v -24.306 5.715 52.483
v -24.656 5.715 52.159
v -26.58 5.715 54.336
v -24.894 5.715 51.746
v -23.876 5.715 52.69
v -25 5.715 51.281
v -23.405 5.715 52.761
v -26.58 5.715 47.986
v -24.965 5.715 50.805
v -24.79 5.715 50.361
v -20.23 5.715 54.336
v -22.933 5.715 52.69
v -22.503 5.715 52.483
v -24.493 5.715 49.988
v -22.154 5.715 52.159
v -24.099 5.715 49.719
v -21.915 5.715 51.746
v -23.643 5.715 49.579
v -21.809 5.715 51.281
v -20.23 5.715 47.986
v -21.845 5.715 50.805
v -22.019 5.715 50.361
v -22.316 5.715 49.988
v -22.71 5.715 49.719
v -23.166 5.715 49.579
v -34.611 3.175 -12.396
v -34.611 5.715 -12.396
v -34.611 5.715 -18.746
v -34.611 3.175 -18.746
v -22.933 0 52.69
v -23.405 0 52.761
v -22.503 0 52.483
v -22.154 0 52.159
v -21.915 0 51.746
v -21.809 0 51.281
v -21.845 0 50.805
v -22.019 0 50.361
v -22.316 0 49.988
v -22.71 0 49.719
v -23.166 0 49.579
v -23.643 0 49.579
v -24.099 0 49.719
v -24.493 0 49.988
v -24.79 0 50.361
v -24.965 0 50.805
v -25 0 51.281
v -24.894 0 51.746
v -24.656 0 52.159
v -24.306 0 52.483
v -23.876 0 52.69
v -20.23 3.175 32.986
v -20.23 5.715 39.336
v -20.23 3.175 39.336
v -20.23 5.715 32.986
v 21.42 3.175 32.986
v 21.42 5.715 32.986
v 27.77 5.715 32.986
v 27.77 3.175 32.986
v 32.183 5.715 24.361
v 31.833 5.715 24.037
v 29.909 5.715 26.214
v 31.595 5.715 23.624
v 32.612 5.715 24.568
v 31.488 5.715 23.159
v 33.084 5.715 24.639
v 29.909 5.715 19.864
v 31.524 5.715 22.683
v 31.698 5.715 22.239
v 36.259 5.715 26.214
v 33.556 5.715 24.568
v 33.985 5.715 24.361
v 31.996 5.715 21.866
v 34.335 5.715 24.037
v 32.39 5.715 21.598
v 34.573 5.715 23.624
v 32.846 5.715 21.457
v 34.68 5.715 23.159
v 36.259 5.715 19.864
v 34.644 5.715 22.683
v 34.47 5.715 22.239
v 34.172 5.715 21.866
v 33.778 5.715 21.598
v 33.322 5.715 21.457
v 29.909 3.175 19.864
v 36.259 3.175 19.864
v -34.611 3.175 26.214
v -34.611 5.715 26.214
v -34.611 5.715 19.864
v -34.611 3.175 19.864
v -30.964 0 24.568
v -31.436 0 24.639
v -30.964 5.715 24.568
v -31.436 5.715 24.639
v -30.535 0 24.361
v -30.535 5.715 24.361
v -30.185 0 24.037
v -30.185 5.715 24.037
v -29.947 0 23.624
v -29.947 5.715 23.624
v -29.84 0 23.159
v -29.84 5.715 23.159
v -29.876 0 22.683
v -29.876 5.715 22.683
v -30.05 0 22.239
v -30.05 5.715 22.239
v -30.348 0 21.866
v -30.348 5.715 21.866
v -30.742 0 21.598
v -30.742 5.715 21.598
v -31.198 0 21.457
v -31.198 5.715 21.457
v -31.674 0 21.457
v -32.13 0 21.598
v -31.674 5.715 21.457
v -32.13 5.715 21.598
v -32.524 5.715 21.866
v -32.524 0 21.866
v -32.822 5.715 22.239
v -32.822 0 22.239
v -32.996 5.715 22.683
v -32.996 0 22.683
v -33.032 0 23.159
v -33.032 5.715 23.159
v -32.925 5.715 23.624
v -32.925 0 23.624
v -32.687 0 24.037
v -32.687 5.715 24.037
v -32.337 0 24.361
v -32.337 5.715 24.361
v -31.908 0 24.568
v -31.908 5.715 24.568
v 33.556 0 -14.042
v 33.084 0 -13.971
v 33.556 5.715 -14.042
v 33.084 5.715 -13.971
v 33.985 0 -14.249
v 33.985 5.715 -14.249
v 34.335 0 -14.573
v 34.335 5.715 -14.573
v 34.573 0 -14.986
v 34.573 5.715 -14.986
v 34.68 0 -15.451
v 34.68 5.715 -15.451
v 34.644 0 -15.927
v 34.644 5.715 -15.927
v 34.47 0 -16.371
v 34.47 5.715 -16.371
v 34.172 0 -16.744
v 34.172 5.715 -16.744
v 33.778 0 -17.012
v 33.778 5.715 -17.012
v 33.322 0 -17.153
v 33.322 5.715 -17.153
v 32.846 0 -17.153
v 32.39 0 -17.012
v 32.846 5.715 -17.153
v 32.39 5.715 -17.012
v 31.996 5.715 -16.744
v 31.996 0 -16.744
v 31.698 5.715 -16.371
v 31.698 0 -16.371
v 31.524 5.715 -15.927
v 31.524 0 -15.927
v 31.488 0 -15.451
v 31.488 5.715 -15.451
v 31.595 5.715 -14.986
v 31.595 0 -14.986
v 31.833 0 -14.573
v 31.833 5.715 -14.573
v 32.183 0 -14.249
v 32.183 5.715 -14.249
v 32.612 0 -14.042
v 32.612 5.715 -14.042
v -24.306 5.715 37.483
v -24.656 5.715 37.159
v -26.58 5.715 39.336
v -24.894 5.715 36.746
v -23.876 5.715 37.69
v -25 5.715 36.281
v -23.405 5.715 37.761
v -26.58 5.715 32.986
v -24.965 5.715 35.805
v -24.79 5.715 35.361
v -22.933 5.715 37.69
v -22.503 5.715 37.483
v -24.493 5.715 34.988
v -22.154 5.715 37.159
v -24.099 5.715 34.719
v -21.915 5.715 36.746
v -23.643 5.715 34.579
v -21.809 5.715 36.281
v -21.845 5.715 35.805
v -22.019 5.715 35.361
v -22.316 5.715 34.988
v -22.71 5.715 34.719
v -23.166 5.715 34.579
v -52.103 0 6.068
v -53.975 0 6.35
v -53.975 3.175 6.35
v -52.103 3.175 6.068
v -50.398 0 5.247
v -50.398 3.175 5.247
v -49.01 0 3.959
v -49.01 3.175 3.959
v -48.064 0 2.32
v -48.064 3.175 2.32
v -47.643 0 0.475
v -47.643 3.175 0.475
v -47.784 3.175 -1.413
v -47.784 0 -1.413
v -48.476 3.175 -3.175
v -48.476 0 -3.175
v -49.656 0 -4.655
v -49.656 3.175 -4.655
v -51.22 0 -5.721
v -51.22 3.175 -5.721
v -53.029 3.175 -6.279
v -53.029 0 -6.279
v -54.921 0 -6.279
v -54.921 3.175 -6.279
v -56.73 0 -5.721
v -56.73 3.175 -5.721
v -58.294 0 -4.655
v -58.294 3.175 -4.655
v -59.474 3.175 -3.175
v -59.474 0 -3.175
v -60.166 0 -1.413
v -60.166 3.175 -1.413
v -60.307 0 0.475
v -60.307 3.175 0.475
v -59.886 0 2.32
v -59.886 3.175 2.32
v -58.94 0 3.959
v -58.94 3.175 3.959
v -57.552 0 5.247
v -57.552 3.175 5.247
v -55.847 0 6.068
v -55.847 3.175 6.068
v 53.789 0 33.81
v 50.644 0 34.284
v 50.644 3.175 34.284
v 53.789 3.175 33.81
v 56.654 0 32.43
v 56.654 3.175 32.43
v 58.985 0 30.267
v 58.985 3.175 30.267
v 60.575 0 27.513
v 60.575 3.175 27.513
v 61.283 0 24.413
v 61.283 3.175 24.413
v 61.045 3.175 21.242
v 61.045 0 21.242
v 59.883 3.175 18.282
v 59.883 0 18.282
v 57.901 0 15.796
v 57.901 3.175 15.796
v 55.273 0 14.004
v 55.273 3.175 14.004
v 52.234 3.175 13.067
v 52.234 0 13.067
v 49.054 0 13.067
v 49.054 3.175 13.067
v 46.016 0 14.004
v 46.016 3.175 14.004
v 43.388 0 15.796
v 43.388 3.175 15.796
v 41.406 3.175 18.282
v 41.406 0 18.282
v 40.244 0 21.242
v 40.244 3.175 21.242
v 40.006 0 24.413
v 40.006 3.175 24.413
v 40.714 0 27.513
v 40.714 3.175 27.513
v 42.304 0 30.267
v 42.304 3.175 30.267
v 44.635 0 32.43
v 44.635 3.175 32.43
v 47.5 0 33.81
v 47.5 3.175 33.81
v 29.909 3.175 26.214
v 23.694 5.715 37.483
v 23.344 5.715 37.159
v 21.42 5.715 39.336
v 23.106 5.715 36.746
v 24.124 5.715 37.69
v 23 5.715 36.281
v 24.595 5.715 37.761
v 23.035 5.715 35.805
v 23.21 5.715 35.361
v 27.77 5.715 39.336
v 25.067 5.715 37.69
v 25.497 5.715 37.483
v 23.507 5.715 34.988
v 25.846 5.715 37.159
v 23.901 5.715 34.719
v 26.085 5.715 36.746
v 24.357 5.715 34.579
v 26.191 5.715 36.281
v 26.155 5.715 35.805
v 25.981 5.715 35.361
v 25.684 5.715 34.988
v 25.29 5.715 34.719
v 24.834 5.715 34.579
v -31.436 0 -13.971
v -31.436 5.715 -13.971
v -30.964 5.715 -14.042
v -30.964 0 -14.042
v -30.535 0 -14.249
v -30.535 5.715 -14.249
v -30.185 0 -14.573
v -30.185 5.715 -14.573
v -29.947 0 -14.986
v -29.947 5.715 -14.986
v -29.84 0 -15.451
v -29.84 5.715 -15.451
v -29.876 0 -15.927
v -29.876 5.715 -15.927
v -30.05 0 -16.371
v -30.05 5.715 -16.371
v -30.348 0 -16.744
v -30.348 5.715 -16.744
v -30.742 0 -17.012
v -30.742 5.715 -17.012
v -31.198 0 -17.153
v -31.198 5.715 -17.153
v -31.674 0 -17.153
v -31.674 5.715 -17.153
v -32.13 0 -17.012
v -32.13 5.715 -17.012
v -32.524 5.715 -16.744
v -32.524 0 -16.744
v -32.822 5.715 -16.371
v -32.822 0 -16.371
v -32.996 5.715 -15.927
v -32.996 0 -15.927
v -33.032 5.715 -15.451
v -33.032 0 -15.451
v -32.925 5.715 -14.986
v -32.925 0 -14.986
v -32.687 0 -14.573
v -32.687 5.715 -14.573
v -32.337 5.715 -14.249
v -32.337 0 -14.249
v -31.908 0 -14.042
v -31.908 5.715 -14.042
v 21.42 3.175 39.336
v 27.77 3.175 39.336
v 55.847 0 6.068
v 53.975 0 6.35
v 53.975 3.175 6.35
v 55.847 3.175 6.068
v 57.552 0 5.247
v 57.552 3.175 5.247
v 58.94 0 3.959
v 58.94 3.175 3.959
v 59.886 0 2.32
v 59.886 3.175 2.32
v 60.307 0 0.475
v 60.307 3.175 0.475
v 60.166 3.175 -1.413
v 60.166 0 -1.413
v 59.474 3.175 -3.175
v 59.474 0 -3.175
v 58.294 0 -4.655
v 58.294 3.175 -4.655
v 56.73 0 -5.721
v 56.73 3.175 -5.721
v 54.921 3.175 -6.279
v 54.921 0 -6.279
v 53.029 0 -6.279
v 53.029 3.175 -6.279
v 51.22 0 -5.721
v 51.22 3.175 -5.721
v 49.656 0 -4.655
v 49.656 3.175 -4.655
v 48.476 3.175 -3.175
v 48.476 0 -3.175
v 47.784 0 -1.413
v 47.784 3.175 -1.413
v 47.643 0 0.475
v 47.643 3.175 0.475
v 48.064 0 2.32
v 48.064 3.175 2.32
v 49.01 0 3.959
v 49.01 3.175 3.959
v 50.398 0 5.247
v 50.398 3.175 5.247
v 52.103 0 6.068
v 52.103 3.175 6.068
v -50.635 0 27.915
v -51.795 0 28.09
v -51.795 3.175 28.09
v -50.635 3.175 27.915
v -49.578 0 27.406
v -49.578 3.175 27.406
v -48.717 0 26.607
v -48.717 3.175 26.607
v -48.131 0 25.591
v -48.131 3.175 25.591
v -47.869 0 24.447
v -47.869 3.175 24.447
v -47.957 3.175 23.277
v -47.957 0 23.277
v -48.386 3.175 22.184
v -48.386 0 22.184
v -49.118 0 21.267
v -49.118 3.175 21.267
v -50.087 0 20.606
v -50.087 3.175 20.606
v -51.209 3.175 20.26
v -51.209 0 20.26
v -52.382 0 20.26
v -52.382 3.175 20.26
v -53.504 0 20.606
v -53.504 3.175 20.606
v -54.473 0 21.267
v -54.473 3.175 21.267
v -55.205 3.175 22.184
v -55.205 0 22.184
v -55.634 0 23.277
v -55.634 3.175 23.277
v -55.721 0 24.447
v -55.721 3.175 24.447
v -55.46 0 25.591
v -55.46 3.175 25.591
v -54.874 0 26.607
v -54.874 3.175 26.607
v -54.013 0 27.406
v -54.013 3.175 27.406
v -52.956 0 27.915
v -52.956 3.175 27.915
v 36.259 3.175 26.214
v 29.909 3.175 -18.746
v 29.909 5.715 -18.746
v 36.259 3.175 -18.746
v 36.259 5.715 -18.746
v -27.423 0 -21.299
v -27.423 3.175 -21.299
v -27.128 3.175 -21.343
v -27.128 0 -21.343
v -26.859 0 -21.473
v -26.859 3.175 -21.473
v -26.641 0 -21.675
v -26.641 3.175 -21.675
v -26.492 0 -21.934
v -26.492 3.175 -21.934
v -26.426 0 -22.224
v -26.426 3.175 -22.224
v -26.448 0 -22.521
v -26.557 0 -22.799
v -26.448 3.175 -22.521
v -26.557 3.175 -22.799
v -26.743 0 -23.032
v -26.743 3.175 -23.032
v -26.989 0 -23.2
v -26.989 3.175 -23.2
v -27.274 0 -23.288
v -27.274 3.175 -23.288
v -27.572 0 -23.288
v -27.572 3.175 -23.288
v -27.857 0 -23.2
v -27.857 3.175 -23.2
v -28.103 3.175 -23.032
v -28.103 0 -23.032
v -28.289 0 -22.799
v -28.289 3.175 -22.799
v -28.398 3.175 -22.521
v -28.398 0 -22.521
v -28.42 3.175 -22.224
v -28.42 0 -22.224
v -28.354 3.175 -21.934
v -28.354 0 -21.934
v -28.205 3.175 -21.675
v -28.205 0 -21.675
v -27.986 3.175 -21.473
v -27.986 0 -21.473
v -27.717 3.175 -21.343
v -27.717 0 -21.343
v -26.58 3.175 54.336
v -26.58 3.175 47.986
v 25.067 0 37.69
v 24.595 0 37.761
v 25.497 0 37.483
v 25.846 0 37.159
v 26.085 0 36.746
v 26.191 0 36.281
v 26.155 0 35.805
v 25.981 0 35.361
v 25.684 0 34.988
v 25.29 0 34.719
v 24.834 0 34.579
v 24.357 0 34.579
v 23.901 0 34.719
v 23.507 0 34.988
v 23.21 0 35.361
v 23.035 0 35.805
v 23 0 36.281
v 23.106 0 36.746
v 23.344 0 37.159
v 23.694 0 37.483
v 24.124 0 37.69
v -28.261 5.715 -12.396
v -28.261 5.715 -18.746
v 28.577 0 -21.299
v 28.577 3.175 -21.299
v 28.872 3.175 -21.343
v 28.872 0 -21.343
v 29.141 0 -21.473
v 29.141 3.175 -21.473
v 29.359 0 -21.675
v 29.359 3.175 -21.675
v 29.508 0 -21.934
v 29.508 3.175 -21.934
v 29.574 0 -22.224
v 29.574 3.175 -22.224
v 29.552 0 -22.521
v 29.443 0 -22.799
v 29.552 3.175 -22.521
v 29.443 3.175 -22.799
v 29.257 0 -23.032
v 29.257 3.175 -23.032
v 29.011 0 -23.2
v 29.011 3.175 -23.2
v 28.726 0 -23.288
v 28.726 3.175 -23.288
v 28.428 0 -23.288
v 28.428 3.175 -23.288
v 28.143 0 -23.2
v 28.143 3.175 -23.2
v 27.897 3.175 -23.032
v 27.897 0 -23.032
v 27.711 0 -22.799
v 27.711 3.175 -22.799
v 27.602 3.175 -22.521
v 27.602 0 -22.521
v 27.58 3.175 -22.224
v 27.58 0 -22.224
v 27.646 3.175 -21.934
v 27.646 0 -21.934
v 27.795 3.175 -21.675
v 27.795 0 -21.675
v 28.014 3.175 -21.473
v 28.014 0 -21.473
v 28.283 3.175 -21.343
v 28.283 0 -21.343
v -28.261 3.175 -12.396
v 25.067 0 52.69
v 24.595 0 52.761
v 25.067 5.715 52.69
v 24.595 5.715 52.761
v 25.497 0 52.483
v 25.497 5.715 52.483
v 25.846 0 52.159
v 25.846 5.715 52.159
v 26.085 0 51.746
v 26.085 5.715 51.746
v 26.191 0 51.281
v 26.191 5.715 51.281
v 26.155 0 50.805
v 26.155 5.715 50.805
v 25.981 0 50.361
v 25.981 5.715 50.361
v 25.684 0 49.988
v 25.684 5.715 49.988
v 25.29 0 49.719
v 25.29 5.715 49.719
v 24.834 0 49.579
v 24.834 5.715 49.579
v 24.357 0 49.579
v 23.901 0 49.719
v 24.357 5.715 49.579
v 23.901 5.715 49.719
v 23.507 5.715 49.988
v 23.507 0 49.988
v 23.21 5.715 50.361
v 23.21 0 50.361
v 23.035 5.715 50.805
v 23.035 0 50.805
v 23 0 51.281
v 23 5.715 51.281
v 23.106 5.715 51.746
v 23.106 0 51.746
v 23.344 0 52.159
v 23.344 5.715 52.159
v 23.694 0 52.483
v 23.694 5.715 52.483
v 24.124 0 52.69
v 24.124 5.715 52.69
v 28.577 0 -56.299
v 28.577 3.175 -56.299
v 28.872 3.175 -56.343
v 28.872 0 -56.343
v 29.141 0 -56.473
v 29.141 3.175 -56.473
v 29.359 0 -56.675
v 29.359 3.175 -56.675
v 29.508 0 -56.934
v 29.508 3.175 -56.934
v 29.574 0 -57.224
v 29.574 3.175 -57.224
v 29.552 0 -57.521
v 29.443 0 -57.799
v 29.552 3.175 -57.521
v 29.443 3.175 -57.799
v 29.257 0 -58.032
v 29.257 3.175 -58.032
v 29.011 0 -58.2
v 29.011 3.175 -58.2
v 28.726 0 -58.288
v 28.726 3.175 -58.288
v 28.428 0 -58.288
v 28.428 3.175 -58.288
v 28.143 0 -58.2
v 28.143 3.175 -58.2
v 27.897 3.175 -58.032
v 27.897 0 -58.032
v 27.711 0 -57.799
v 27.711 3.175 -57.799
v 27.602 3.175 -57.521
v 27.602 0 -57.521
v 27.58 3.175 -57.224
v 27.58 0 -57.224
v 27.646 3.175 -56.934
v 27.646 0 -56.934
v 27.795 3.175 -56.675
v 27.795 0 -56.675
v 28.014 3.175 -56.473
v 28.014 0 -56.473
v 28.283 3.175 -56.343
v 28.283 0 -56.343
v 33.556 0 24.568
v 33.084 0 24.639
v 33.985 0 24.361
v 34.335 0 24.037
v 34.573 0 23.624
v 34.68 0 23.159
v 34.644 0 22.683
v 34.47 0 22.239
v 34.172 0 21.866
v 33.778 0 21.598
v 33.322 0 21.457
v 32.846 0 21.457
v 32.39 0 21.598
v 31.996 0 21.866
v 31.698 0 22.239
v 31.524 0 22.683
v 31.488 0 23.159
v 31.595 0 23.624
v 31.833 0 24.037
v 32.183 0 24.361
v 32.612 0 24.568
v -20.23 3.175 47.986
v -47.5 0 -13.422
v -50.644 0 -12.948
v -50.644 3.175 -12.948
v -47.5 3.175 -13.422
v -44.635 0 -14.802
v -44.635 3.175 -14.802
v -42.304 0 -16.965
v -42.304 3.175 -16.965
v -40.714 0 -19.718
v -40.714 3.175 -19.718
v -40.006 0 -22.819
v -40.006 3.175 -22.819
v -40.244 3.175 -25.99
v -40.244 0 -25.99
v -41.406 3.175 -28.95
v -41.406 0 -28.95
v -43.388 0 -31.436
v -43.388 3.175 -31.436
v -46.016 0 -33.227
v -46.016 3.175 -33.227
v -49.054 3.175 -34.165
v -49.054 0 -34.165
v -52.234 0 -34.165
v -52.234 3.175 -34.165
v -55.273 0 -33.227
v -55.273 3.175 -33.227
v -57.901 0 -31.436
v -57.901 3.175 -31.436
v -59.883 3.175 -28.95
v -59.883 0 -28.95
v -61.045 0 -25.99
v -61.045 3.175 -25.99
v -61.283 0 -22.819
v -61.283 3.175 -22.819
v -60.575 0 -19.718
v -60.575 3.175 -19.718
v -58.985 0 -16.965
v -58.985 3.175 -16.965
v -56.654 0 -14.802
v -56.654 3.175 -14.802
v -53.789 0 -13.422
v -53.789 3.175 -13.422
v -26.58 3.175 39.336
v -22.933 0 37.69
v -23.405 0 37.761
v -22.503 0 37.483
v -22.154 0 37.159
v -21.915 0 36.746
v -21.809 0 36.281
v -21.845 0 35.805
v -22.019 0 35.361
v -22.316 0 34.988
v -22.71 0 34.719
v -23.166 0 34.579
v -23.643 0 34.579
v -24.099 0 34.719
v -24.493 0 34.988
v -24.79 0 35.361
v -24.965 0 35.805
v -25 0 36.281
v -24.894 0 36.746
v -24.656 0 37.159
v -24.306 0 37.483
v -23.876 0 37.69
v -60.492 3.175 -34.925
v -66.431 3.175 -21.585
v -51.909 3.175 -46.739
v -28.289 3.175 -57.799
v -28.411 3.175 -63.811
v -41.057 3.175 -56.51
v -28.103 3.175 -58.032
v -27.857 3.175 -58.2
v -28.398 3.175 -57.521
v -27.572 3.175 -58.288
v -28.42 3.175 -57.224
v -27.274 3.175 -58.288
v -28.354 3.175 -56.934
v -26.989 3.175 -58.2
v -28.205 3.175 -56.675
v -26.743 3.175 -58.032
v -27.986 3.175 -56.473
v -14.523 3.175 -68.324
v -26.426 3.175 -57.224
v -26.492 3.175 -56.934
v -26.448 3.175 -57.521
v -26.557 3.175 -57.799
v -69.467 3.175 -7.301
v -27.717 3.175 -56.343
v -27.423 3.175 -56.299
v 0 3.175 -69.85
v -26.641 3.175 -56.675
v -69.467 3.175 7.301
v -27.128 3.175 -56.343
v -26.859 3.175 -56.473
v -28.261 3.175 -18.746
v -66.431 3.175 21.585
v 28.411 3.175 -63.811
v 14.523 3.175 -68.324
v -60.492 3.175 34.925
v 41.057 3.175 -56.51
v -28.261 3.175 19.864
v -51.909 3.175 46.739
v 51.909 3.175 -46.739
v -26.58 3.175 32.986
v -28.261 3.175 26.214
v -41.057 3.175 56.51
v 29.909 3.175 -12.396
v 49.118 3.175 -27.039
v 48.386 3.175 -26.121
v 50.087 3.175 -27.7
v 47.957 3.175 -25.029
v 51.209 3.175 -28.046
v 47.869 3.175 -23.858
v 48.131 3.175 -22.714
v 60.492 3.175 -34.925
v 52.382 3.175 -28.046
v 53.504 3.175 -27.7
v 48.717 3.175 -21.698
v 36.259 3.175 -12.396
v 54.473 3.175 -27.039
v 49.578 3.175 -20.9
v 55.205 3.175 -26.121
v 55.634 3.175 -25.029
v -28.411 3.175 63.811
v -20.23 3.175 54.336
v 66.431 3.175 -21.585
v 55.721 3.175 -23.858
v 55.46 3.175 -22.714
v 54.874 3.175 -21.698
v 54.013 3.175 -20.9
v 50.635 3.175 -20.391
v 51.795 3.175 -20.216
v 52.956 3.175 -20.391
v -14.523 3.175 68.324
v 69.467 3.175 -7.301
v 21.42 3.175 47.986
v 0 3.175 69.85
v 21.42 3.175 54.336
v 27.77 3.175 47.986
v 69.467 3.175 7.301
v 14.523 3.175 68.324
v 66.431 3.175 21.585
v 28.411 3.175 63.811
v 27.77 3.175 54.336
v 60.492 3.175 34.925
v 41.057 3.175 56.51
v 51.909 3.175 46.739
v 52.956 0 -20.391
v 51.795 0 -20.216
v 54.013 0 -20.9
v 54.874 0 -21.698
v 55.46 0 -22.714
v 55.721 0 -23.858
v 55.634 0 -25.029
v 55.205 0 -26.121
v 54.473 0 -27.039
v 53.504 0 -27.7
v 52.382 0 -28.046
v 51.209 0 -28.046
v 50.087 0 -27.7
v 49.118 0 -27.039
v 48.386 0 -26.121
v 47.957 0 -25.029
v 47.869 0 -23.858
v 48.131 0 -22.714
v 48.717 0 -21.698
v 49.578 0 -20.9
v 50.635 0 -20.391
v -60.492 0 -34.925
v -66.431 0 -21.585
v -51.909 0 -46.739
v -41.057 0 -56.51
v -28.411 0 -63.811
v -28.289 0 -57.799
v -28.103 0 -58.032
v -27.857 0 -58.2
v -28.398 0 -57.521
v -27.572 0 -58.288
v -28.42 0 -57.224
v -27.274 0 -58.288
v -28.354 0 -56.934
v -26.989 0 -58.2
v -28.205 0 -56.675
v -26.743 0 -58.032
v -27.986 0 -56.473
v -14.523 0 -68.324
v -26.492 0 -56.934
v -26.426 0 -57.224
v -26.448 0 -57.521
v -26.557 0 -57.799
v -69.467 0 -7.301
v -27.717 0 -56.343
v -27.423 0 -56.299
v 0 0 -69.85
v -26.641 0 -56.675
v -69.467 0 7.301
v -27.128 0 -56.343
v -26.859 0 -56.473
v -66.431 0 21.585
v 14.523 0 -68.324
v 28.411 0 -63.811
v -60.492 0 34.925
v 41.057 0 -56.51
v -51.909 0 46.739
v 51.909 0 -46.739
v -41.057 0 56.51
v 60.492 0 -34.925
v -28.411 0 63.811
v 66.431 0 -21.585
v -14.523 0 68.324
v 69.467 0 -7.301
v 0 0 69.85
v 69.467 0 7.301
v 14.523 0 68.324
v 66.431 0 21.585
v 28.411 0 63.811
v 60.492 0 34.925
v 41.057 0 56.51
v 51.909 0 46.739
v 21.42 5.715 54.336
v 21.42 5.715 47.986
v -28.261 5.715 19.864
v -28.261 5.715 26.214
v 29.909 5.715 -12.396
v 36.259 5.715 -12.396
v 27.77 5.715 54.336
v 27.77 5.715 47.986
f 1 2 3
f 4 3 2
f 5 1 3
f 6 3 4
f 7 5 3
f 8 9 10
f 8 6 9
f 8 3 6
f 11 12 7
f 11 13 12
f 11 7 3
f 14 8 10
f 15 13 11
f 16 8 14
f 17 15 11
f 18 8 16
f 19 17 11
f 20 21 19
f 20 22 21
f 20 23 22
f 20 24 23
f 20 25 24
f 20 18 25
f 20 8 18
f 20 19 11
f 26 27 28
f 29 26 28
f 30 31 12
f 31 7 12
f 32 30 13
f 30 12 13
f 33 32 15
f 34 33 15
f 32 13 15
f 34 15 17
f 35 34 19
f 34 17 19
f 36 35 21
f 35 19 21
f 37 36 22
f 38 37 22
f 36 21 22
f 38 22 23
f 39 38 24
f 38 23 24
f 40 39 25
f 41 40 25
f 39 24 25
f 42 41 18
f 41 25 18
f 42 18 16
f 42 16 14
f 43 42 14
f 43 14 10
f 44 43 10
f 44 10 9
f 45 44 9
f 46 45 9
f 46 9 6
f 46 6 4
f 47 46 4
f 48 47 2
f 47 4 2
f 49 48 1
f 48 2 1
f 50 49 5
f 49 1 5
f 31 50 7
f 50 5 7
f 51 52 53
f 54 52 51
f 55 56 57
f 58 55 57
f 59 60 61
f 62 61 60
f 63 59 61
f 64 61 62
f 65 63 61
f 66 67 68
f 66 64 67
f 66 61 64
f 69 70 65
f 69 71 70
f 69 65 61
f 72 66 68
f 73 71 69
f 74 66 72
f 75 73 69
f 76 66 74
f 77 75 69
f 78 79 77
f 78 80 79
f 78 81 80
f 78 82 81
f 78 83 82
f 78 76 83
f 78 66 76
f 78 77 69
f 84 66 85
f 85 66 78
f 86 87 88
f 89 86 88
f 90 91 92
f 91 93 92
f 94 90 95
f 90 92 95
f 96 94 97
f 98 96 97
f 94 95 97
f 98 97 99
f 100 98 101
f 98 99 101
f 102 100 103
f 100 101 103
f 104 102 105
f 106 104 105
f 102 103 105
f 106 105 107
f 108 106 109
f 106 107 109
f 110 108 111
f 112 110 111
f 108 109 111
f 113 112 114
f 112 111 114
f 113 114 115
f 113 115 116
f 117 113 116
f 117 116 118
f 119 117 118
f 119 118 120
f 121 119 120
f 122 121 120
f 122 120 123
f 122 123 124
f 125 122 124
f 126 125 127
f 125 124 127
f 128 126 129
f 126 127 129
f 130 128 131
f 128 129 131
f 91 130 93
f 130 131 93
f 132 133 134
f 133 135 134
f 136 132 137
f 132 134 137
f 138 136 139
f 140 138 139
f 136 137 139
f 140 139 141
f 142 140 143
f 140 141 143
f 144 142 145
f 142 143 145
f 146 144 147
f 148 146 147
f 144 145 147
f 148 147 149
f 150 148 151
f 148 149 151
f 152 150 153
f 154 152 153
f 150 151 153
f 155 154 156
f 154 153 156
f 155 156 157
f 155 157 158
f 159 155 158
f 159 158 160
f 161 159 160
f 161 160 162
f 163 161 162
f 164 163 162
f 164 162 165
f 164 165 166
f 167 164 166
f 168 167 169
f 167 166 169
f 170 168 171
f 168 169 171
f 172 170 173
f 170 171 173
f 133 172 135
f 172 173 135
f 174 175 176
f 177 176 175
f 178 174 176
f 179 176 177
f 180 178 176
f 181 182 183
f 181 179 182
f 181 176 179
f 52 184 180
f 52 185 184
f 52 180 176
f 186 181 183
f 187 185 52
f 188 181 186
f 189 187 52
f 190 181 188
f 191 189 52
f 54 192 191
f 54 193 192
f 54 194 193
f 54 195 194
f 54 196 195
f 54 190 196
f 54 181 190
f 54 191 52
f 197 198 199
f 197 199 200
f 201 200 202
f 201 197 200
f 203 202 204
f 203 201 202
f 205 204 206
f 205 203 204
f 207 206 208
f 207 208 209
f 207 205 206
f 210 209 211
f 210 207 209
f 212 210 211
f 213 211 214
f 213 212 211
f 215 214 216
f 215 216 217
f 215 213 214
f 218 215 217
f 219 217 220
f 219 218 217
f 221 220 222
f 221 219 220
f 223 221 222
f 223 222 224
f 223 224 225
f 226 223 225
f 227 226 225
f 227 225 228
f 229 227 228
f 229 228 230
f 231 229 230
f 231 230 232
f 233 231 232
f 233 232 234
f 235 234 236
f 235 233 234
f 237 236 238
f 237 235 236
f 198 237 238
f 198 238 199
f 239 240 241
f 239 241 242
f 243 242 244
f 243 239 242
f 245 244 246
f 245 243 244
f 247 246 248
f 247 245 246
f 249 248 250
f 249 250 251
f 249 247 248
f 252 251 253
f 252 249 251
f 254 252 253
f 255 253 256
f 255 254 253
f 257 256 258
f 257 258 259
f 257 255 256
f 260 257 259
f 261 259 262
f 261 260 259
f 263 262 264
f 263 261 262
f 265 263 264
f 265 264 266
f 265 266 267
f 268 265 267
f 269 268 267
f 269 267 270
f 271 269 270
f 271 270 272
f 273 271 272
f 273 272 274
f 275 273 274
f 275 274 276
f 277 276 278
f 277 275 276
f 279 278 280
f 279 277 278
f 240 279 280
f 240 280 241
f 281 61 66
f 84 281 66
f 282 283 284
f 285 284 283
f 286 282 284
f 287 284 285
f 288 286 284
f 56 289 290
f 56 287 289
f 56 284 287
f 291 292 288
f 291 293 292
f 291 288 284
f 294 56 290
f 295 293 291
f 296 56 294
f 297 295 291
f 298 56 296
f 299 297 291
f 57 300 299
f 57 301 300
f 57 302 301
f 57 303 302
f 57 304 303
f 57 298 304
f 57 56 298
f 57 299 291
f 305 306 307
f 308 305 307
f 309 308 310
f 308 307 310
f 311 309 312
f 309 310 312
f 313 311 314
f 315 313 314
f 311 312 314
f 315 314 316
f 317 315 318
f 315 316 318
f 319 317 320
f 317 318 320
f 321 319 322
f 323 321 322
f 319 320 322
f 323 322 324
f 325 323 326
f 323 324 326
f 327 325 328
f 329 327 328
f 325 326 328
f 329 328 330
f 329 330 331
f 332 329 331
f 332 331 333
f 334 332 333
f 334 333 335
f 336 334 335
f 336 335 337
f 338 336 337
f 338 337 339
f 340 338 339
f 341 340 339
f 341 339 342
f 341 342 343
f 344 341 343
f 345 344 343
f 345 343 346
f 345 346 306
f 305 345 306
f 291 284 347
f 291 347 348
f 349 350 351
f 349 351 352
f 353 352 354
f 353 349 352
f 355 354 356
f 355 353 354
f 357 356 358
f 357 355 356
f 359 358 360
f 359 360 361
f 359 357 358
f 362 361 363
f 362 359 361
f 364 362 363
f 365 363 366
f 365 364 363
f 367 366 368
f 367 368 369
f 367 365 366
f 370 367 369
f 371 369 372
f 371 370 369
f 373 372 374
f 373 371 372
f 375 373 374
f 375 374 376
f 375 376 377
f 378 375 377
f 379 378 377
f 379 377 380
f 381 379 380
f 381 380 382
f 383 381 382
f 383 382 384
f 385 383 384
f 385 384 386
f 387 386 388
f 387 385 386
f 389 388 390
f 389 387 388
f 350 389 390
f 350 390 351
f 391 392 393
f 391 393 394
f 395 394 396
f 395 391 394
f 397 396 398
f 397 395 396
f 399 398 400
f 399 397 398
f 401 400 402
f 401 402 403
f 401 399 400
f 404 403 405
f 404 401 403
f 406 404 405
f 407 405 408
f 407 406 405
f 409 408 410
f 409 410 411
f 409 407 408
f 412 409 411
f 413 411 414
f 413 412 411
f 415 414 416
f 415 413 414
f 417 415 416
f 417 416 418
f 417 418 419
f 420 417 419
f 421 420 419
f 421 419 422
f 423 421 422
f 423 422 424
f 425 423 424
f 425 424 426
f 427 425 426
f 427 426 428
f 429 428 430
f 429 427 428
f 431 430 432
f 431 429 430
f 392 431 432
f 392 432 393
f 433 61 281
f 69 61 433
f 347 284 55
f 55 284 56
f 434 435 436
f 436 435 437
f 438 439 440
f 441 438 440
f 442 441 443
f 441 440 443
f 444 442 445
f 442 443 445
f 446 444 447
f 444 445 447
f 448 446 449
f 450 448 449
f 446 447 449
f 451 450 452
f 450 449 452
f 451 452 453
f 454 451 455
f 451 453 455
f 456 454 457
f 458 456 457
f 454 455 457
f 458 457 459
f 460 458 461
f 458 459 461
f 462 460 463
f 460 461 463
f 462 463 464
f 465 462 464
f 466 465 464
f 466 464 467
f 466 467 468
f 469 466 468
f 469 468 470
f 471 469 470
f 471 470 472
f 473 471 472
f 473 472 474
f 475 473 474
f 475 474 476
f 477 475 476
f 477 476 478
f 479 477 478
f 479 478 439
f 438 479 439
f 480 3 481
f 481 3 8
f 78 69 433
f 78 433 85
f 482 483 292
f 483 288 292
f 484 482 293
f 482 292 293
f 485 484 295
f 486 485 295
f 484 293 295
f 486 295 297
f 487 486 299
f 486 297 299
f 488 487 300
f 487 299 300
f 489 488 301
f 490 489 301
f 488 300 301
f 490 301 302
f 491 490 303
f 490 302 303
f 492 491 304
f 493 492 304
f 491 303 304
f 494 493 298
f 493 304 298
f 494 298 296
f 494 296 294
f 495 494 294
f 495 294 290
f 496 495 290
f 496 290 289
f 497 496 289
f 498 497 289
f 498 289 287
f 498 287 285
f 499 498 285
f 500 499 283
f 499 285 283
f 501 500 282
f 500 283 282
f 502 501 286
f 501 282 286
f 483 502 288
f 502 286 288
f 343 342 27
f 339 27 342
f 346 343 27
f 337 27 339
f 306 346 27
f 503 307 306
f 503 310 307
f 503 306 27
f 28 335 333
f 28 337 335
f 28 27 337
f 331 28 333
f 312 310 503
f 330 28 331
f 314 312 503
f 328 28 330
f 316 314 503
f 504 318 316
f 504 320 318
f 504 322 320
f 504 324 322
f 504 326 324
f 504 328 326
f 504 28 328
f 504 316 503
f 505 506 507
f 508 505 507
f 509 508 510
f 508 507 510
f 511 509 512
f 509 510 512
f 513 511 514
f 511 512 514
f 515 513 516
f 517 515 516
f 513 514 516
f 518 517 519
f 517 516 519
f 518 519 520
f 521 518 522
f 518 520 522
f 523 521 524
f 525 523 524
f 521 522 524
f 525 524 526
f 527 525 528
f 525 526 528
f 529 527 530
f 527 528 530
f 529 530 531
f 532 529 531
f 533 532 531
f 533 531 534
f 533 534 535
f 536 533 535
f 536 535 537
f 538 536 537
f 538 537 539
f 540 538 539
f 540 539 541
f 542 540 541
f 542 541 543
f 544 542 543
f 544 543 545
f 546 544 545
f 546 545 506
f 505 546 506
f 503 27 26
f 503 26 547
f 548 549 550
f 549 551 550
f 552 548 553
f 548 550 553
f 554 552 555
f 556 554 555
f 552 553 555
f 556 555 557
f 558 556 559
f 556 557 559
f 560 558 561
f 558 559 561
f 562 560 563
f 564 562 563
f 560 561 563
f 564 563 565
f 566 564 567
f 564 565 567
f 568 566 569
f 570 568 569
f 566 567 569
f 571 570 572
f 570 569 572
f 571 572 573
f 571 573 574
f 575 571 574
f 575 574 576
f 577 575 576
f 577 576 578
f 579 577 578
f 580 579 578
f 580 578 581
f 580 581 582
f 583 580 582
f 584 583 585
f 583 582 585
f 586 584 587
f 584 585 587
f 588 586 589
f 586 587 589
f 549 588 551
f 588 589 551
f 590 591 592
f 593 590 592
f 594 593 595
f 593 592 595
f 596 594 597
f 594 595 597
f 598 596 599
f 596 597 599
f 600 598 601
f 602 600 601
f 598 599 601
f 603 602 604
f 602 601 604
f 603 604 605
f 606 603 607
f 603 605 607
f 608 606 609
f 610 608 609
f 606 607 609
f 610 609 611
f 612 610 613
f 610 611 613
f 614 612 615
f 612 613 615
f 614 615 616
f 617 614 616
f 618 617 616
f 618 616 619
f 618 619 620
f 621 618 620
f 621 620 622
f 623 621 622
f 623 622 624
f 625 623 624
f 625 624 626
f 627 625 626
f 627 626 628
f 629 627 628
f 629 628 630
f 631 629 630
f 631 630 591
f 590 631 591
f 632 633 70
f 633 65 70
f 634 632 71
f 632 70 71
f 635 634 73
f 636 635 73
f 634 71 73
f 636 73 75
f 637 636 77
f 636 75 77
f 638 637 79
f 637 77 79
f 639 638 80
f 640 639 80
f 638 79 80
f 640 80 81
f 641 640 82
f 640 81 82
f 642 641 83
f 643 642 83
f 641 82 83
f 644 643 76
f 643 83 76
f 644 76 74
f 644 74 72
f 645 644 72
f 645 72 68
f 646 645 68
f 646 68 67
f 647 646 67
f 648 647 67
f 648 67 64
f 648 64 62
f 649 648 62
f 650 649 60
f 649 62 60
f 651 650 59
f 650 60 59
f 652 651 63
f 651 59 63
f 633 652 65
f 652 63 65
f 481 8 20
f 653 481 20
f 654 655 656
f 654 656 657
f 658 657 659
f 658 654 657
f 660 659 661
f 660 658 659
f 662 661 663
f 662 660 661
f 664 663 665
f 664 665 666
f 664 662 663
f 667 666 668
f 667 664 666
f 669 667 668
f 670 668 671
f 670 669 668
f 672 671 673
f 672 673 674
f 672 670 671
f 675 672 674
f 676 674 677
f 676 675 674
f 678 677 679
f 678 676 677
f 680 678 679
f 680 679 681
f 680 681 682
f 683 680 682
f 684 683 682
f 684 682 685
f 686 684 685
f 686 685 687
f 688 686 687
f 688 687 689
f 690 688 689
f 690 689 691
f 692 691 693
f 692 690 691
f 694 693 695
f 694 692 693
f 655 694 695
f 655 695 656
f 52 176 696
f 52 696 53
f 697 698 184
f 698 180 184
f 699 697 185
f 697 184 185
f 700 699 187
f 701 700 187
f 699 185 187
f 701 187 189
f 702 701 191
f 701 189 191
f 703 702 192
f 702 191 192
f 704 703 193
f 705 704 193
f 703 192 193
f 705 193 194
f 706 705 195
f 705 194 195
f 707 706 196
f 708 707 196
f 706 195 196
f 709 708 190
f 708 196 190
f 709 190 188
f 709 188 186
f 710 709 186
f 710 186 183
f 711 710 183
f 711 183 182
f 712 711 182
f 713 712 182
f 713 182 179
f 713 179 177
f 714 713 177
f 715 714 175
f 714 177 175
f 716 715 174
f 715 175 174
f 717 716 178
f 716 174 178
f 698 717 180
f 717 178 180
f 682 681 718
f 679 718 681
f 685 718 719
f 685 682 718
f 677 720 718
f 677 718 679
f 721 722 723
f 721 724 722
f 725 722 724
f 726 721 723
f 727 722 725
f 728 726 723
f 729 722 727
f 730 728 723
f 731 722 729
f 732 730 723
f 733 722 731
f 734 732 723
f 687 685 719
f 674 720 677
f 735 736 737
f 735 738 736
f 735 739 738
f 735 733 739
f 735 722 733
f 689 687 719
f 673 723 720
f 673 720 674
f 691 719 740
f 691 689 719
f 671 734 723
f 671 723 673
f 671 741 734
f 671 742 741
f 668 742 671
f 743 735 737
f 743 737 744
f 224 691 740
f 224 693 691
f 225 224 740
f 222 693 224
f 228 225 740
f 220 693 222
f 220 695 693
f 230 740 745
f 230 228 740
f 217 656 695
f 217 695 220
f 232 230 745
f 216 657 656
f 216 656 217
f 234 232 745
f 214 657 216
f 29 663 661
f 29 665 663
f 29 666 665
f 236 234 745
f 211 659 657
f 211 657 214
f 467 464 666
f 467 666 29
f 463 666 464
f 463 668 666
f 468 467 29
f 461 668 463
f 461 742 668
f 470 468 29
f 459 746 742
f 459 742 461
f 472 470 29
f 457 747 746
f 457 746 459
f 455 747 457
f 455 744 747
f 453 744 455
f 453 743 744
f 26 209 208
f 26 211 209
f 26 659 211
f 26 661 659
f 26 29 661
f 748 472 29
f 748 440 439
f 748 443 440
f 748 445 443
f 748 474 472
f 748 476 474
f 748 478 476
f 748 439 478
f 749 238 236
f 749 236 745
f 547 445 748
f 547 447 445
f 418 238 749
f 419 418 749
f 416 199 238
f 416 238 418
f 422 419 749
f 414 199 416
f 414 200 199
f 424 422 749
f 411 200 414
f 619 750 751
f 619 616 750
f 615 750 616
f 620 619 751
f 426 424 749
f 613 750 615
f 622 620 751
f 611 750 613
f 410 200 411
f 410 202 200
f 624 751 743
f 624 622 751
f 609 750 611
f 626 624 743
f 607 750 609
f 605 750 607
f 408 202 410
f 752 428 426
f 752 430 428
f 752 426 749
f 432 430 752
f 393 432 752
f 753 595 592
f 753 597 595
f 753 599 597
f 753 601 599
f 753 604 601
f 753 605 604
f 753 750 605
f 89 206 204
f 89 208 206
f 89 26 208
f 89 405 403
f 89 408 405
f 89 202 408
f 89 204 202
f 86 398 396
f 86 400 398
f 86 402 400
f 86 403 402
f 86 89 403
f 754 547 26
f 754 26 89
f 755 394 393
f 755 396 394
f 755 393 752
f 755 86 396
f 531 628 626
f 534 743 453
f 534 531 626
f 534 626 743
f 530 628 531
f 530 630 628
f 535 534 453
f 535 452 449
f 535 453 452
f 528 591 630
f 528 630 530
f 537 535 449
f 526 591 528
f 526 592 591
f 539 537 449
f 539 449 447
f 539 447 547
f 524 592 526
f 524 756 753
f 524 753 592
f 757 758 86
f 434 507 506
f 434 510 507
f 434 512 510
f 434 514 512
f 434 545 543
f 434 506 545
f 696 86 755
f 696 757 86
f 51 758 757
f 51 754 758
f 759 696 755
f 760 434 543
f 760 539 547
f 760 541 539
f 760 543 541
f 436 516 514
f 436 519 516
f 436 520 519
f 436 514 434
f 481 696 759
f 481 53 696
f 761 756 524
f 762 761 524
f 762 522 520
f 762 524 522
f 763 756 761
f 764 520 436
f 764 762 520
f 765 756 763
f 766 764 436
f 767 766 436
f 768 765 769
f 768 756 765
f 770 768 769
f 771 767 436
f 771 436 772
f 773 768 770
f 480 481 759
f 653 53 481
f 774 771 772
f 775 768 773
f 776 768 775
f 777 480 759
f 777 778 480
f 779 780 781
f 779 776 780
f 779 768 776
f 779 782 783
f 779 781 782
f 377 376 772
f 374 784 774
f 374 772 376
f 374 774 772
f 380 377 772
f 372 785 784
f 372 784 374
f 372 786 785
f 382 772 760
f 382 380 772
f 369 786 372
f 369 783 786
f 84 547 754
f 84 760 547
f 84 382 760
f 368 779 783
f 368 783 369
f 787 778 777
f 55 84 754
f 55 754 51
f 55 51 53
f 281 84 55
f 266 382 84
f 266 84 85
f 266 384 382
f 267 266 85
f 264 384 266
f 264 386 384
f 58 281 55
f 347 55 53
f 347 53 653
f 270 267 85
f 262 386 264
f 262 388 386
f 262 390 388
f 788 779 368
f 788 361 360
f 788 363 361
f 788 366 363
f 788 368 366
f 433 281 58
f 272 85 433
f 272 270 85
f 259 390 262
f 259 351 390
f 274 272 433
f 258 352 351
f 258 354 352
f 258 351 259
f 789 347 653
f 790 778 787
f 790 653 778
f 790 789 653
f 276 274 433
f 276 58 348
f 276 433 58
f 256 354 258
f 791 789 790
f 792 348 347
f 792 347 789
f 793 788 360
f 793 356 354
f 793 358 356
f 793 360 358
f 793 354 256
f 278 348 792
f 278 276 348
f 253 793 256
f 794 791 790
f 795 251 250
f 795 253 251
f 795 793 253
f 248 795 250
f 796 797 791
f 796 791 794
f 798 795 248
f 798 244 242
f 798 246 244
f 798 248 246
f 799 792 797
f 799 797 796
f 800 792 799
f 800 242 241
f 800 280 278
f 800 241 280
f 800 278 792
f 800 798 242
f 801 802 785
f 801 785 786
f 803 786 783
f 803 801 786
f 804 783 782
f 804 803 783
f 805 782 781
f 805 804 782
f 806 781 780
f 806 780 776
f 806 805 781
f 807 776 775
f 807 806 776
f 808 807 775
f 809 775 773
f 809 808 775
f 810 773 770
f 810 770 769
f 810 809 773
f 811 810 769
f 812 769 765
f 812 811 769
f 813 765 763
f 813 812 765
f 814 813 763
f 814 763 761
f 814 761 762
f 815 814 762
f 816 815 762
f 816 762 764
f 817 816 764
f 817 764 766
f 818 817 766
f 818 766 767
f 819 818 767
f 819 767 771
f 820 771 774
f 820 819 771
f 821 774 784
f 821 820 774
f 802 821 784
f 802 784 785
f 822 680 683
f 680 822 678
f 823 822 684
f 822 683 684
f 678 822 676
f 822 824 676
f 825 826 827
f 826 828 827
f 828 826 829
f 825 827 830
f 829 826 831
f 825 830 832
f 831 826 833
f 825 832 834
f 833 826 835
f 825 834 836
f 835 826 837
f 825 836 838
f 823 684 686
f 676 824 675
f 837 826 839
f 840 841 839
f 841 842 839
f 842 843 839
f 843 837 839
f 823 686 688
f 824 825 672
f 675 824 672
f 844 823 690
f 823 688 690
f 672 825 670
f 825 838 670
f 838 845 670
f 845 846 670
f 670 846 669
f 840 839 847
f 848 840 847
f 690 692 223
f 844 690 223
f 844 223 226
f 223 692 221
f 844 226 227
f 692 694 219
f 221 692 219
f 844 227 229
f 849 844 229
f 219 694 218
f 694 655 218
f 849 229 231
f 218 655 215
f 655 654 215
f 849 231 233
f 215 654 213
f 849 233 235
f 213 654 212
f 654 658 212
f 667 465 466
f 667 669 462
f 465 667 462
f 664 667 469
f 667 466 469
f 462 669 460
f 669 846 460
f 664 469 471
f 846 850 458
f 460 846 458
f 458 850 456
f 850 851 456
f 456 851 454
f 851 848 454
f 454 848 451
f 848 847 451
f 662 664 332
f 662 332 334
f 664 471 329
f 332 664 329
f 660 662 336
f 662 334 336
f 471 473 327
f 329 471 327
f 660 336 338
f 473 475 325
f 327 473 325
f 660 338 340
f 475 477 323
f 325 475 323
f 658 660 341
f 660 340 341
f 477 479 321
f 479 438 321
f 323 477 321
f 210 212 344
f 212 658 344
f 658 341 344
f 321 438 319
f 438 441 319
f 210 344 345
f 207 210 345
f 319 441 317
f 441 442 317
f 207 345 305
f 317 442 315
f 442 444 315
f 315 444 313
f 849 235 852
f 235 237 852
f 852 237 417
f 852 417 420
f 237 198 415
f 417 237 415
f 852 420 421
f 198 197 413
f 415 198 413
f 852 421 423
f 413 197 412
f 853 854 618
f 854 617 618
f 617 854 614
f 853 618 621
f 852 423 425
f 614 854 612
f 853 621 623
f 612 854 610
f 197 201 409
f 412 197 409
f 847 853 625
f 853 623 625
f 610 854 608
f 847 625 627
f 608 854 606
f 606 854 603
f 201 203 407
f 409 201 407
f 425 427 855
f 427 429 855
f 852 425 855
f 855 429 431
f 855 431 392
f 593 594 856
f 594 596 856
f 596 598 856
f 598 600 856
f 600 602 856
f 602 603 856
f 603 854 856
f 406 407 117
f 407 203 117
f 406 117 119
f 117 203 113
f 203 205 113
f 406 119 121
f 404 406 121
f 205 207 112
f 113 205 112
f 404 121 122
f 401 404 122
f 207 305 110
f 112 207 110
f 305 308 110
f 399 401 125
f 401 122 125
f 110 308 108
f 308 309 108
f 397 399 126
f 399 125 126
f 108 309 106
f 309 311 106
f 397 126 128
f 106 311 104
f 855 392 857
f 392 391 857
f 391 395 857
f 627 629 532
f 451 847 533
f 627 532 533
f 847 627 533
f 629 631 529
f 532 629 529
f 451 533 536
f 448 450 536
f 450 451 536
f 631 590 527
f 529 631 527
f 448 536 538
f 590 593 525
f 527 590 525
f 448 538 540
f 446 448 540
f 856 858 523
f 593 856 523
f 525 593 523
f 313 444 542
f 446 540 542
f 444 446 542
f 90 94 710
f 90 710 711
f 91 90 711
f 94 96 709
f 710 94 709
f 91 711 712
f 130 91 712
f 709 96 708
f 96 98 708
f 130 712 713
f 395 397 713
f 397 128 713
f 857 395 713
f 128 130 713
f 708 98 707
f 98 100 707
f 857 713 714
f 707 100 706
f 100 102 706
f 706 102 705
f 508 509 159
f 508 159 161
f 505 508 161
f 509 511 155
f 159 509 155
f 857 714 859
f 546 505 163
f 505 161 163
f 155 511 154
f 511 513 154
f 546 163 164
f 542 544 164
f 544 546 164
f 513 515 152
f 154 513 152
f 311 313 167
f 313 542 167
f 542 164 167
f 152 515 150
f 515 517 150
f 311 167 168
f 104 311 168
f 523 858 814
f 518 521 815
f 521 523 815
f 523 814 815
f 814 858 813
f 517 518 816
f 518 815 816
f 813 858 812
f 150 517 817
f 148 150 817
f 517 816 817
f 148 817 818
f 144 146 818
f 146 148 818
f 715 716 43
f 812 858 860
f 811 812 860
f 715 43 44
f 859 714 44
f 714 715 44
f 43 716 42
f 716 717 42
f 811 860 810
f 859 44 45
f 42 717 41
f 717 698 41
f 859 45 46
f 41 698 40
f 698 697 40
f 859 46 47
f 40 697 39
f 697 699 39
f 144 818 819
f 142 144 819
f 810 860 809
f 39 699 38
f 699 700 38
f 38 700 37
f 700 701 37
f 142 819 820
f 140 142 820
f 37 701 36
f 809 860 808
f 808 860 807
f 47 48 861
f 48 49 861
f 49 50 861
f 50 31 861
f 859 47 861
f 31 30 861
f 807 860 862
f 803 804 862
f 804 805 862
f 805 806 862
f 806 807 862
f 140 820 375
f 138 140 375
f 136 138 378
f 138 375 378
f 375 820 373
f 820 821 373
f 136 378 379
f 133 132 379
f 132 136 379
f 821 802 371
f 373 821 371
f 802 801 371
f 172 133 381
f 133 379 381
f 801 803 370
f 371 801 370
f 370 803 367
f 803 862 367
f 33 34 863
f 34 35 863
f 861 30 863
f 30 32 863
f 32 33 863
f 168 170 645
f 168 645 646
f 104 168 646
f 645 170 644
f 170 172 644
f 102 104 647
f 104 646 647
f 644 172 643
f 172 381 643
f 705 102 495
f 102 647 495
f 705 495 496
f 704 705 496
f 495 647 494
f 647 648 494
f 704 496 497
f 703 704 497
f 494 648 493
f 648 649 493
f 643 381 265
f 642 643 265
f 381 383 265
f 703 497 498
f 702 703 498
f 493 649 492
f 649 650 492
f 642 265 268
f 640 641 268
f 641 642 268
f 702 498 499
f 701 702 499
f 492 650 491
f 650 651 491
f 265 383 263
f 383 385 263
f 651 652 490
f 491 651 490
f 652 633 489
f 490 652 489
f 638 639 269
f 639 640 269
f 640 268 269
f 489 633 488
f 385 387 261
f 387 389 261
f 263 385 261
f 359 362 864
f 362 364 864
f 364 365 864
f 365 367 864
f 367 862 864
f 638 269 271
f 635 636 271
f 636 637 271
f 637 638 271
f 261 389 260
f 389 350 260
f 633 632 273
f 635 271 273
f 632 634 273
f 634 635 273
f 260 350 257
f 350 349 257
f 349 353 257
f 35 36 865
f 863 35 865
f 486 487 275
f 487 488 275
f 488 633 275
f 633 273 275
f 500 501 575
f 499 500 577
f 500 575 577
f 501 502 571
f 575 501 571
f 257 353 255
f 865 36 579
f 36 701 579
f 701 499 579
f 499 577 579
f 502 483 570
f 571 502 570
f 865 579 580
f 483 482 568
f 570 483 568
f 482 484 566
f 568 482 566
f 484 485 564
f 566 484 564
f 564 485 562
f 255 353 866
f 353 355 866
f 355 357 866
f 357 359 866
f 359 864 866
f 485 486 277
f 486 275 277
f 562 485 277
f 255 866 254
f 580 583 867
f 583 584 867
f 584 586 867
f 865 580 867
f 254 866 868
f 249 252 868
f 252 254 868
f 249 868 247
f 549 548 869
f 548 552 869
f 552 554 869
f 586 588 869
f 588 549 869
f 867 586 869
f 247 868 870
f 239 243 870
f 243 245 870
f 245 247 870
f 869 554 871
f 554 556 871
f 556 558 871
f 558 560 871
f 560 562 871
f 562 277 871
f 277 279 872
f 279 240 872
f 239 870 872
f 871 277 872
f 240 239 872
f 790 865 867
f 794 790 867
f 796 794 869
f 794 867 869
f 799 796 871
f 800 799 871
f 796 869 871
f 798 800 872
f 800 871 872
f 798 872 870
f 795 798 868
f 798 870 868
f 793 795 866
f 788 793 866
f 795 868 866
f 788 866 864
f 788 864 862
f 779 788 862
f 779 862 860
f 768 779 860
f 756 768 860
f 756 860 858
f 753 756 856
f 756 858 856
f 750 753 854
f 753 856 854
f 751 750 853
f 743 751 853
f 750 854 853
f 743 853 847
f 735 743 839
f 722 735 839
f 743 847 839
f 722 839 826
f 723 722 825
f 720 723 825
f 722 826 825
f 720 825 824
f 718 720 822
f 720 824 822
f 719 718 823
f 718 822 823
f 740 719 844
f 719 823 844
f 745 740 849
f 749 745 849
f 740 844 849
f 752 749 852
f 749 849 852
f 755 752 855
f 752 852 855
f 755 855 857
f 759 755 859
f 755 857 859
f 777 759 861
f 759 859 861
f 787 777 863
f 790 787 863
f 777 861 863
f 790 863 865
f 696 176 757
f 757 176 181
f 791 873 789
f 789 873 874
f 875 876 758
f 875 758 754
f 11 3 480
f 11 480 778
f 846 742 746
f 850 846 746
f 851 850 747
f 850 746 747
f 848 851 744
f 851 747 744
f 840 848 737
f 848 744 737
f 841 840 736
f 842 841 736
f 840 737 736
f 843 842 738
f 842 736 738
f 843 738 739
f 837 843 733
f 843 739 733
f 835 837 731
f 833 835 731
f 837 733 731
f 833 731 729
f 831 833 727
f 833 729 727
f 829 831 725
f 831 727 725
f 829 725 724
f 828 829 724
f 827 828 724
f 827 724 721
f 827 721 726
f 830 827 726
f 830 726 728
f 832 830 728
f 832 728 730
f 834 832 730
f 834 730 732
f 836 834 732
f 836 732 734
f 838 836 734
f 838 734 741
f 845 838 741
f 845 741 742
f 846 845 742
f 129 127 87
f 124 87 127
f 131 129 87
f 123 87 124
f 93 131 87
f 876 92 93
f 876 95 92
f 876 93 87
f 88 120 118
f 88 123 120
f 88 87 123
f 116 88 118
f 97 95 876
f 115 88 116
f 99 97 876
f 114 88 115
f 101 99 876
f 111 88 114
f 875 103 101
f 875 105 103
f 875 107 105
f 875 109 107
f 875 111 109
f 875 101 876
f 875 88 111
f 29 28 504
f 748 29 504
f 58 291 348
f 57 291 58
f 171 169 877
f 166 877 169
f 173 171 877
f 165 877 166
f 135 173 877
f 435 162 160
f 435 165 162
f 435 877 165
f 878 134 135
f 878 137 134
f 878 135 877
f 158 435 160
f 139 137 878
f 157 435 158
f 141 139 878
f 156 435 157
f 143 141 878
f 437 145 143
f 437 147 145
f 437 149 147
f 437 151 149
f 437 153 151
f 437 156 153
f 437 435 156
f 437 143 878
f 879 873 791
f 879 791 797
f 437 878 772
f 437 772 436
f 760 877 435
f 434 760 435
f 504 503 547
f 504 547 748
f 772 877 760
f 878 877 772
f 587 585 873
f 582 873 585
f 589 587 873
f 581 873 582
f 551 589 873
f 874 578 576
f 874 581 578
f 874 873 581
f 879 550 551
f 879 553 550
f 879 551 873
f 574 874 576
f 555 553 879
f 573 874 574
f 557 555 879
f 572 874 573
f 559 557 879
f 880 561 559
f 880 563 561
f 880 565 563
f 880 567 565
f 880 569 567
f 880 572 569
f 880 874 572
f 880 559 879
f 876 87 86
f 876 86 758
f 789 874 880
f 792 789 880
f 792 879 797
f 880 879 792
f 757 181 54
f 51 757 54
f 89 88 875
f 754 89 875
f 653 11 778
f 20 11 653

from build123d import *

# Parameters (mm, degrees)
SKETCH1_R           = 69.85
SKETCH1_R_2         = 3.937
SKETCH1_R_3         = 6.35
SKETCH1_R_4         = 10.668
BOSS_EXTRUDE1_DEPTH = 3.175
SKETCH5_R           = 1.00000054
CUT_EXTRUDE1_DEPTH  = 25.4
SKETCH2_R           = 1.600000102
SKETCH2_R_2         = 1.6
CUT_EXTRUDE2_DEPTH  = 25.4
BOSS_EXTRUDE2_START = 2.54
SKETCH2_9_W         = 6.35
SKETCH2_9_H         = 6.35
SKETCH2_9_R         = 1.6
SKETCH2_9_R_2       = 1.600000102
BOSS_EXTRUDE2_DEPTH = 2.54


with BuildPart() as part:
    # Sketch1 → Boss-Extrude1 (new body)
    with BuildSketch(Plane(origin=(0, 0, 0), x_dir=(1, 0, 0), z_dir=(0, 1, 0))):
        Circle(SKETCH1_R)
        with Locations((-51.795490029, -24.152633658)):
            Circle(SKETCH1_R_2, mode=Mode.SUBTRACT)
        with Locations((-53.975, 0)):
            Circle(SKETCH1_R_3, mode=Mode.SUBTRACT)
        with Locations((-50.64447914, 23.615908466)):
            Circle(SKETCH1_R_4, mode=Mode.SUBTRACT)
        with Locations((51.795490029, 24.152633658)):
            Circle(SKETCH1_R_2, mode=Mode.SUBTRACT)
        with Locations((53.975, 0)):
            Circle(SKETCH1_R_3, mode=Mode.SUBTRACT)
        with Locations((50.64447914, -23.615908466)):
            Circle(SKETCH1_R_4, mode=Mode.SUBTRACT)
    extrude(amount=BOSS_EXTRUDE1_DEPTH)

    # Sketch5 → Cut-Extrude1 (cut)
    with BuildSketch(Plane(origin=(0, 3.175, 0), x_dir=(1, 0, 0), z_dir=(0, 1, 0))):
        with Locations((-27.422738659, 57.298926561)):
            Circle(SKETCH5_R)
        with Locations((28.577261341, 57.298926561)):
            Circle(SKETCH5_R)
        with Locations((28.577261341, 22.298926561)):
            Circle(SKETCH5_R)
        with Locations((-27.422738659, 22.298926561)):
            Circle(SKETCH5_R)
    extrude(amount=-CUT_EXTRUDE1_DEPTH, mode=Mode.SUBTRACT)

    # Sketch2 → Cut-Extrude2 (cut)
    with BuildSketch(Plane(origin=(0, 3.175, 0), x_dir=(1, 0, 0), z_dir=(0, 1, 0))):
        with Locations((-23.404626028, -36.160958579)):
            Circle(SKETCH2_R)
        with Locations((24.595373972, -36.160958579)):
            Circle(SKETCH2_R)
        with Locations((-23.404626028, -51.160958579)):
            Circle(SKETCH2_R)
        with Locations((24.595373972, -51.160958579)):
            Circle(SKETCH2_R)
        with Locations((-31.436025901, 15.570800323)):
            Circle(SKETCH2_R_2)
        with Locations((33.083974099, 15.570800323)):
            Circle(SKETCH2_R)
        with Locations((-31.436025901, -23.039199677)):
            Circle(SKETCH2_R)
        with Locations((33.083974099, -23.039199677)):
            Circle(SKETCH2_R)
    extrude(amount=-CUT_EXTRUDE2_DEPTH, mode=Mode.SUBTRACT)

    # Sketch2<9> → Boss-Extrude2 (add)
    # profile 1 of 8: a face of its own
    with BuildSketch(Plane(origin=(0, 3.175, 0), x_dir=(1, 0, 0), z_dir=(0, 1, 0)).offset(BOSS_EXTRUDE2_START)):
        with Locations((-31.436025901, 15.570800323)):
            Rectangle(SKETCH2_9_W, SKETCH2_9_H)
        with Locations((-31.436025901, 15.570800323)):
            Circle(SKETCH2_9_R, mode=Mode.SUBTRACT)
    # profile 2 of 8: a face of its own
    with BuildSketch(Plane(origin=(0, 3.175, 0), x_dir=(1, 0, 0), z_dir=(0, 1, 0)).offset(BOSS_EXTRUDE2_START)):
        with Locations((-23.404626028, -36.160958579)):
            Rectangle(SKETCH2_9_W, SKETCH2_9_H)
        with Locations((-23.404626028, -36.160958579)):
            Circle(SKETCH2_9_R_2, mode=Mode.SUBTRACT)
    # profile 3 of 8: a face of its own
    with BuildSketch(Plane(origin=(0, 3.175, 0), x_dir=(1, 0, 0), z_dir=(0, 1, 0)).offset(BOSS_EXTRUDE2_START)):
        with Locations((24.595373972, -36.160958579)):
            Rectangle(SKETCH2_9_W, SKETCH2_9_H)
        with Locations((24.595373972, -36.160958579)):
            Circle(SKETCH2_9_R_2, mode=Mode.SUBTRACT)
    # profile 4 of 8: a face of its own
    with BuildSketch(Plane(origin=(0, 3.175, 0), x_dir=(1, 0, 0), z_dir=(0, 1, 0)).offset(BOSS_EXTRUDE2_START)):
        with Locations((-23.404626028, -51.160958579)):
            Rectangle(SKETCH2_9_W, SKETCH2_9_H)
        with Locations((-23.404626028, -51.160958579)):
            Circle(SKETCH2_9_R_2, mode=Mode.SUBTRACT)
    # profile 5 of 8: a face of its own
    with BuildSketch(Plane(origin=(0, 3.175, 0), x_dir=(1, 0, 0), z_dir=(0, 1, 0)).offset(BOSS_EXTRUDE2_START)):
        with Locations((24.595373972, -51.160958579)):
            Rectangle(SKETCH2_9_W, SKETCH2_9_H)
        with Locations((24.595373972, -51.160958579)):
            Circle(SKETCH2_9_R_2, mode=Mode.SUBTRACT)
    # profile 6 of 8: a face of its own
    with BuildSketch(Plane(origin=(0, 3.175, 0), x_dir=(1, 0, 0), z_dir=(0, 1, 0)).offset(BOSS_EXTRUDE2_START)):
        with Locations((-31.436025901, -23.039199677)):
            Rectangle(SKETCH2_9_W, SKETCH2_9_H)
        with Locations((-31.436025901, -23.039199677)):
            Circle(SKETCH2_9_R_2, mode=Mode.SUBTRACT)
    # profile 7 of 8: a face of its own
    with BuildSketch(Plane(origin=(0, 3.175, 0), x_dir=(1, 0, 0), z_dir=(0, 1, 0)).offset(BOSS_EXTRUDE2_START)):
        with Locations((33.083974099, -23.039199677)):
            Rectangle(SKETCH2_9_W, SKETCH2_9_H)
        with Locations((33.083974099, -23.039199677)):
            Circle(SKETCH2_9_R_2, mode=Mode.SUBTRACT)
    # profile 8 of 8: a face of its own
    with BuildSketch(Plane(origin=(0, 3.175, 0), x_dir=(1, 0, 0), z_dir=(0, 1, 0)).offset(BOSS_EXTRUDE2_START)):
        with Locations((33.083974099, 15.570800323)):
            Rectangle(SKETCH2_9_W, SKETCH2_9_H)
        with Locations((33.083974099, 15.570800323)):
            Circle(SKETCH2_9_R_2, mode=Mode.SUBTRACT)
    extrude(amount=-BOSS_EXTRUDE2_DEPTH)


solid = part.part
